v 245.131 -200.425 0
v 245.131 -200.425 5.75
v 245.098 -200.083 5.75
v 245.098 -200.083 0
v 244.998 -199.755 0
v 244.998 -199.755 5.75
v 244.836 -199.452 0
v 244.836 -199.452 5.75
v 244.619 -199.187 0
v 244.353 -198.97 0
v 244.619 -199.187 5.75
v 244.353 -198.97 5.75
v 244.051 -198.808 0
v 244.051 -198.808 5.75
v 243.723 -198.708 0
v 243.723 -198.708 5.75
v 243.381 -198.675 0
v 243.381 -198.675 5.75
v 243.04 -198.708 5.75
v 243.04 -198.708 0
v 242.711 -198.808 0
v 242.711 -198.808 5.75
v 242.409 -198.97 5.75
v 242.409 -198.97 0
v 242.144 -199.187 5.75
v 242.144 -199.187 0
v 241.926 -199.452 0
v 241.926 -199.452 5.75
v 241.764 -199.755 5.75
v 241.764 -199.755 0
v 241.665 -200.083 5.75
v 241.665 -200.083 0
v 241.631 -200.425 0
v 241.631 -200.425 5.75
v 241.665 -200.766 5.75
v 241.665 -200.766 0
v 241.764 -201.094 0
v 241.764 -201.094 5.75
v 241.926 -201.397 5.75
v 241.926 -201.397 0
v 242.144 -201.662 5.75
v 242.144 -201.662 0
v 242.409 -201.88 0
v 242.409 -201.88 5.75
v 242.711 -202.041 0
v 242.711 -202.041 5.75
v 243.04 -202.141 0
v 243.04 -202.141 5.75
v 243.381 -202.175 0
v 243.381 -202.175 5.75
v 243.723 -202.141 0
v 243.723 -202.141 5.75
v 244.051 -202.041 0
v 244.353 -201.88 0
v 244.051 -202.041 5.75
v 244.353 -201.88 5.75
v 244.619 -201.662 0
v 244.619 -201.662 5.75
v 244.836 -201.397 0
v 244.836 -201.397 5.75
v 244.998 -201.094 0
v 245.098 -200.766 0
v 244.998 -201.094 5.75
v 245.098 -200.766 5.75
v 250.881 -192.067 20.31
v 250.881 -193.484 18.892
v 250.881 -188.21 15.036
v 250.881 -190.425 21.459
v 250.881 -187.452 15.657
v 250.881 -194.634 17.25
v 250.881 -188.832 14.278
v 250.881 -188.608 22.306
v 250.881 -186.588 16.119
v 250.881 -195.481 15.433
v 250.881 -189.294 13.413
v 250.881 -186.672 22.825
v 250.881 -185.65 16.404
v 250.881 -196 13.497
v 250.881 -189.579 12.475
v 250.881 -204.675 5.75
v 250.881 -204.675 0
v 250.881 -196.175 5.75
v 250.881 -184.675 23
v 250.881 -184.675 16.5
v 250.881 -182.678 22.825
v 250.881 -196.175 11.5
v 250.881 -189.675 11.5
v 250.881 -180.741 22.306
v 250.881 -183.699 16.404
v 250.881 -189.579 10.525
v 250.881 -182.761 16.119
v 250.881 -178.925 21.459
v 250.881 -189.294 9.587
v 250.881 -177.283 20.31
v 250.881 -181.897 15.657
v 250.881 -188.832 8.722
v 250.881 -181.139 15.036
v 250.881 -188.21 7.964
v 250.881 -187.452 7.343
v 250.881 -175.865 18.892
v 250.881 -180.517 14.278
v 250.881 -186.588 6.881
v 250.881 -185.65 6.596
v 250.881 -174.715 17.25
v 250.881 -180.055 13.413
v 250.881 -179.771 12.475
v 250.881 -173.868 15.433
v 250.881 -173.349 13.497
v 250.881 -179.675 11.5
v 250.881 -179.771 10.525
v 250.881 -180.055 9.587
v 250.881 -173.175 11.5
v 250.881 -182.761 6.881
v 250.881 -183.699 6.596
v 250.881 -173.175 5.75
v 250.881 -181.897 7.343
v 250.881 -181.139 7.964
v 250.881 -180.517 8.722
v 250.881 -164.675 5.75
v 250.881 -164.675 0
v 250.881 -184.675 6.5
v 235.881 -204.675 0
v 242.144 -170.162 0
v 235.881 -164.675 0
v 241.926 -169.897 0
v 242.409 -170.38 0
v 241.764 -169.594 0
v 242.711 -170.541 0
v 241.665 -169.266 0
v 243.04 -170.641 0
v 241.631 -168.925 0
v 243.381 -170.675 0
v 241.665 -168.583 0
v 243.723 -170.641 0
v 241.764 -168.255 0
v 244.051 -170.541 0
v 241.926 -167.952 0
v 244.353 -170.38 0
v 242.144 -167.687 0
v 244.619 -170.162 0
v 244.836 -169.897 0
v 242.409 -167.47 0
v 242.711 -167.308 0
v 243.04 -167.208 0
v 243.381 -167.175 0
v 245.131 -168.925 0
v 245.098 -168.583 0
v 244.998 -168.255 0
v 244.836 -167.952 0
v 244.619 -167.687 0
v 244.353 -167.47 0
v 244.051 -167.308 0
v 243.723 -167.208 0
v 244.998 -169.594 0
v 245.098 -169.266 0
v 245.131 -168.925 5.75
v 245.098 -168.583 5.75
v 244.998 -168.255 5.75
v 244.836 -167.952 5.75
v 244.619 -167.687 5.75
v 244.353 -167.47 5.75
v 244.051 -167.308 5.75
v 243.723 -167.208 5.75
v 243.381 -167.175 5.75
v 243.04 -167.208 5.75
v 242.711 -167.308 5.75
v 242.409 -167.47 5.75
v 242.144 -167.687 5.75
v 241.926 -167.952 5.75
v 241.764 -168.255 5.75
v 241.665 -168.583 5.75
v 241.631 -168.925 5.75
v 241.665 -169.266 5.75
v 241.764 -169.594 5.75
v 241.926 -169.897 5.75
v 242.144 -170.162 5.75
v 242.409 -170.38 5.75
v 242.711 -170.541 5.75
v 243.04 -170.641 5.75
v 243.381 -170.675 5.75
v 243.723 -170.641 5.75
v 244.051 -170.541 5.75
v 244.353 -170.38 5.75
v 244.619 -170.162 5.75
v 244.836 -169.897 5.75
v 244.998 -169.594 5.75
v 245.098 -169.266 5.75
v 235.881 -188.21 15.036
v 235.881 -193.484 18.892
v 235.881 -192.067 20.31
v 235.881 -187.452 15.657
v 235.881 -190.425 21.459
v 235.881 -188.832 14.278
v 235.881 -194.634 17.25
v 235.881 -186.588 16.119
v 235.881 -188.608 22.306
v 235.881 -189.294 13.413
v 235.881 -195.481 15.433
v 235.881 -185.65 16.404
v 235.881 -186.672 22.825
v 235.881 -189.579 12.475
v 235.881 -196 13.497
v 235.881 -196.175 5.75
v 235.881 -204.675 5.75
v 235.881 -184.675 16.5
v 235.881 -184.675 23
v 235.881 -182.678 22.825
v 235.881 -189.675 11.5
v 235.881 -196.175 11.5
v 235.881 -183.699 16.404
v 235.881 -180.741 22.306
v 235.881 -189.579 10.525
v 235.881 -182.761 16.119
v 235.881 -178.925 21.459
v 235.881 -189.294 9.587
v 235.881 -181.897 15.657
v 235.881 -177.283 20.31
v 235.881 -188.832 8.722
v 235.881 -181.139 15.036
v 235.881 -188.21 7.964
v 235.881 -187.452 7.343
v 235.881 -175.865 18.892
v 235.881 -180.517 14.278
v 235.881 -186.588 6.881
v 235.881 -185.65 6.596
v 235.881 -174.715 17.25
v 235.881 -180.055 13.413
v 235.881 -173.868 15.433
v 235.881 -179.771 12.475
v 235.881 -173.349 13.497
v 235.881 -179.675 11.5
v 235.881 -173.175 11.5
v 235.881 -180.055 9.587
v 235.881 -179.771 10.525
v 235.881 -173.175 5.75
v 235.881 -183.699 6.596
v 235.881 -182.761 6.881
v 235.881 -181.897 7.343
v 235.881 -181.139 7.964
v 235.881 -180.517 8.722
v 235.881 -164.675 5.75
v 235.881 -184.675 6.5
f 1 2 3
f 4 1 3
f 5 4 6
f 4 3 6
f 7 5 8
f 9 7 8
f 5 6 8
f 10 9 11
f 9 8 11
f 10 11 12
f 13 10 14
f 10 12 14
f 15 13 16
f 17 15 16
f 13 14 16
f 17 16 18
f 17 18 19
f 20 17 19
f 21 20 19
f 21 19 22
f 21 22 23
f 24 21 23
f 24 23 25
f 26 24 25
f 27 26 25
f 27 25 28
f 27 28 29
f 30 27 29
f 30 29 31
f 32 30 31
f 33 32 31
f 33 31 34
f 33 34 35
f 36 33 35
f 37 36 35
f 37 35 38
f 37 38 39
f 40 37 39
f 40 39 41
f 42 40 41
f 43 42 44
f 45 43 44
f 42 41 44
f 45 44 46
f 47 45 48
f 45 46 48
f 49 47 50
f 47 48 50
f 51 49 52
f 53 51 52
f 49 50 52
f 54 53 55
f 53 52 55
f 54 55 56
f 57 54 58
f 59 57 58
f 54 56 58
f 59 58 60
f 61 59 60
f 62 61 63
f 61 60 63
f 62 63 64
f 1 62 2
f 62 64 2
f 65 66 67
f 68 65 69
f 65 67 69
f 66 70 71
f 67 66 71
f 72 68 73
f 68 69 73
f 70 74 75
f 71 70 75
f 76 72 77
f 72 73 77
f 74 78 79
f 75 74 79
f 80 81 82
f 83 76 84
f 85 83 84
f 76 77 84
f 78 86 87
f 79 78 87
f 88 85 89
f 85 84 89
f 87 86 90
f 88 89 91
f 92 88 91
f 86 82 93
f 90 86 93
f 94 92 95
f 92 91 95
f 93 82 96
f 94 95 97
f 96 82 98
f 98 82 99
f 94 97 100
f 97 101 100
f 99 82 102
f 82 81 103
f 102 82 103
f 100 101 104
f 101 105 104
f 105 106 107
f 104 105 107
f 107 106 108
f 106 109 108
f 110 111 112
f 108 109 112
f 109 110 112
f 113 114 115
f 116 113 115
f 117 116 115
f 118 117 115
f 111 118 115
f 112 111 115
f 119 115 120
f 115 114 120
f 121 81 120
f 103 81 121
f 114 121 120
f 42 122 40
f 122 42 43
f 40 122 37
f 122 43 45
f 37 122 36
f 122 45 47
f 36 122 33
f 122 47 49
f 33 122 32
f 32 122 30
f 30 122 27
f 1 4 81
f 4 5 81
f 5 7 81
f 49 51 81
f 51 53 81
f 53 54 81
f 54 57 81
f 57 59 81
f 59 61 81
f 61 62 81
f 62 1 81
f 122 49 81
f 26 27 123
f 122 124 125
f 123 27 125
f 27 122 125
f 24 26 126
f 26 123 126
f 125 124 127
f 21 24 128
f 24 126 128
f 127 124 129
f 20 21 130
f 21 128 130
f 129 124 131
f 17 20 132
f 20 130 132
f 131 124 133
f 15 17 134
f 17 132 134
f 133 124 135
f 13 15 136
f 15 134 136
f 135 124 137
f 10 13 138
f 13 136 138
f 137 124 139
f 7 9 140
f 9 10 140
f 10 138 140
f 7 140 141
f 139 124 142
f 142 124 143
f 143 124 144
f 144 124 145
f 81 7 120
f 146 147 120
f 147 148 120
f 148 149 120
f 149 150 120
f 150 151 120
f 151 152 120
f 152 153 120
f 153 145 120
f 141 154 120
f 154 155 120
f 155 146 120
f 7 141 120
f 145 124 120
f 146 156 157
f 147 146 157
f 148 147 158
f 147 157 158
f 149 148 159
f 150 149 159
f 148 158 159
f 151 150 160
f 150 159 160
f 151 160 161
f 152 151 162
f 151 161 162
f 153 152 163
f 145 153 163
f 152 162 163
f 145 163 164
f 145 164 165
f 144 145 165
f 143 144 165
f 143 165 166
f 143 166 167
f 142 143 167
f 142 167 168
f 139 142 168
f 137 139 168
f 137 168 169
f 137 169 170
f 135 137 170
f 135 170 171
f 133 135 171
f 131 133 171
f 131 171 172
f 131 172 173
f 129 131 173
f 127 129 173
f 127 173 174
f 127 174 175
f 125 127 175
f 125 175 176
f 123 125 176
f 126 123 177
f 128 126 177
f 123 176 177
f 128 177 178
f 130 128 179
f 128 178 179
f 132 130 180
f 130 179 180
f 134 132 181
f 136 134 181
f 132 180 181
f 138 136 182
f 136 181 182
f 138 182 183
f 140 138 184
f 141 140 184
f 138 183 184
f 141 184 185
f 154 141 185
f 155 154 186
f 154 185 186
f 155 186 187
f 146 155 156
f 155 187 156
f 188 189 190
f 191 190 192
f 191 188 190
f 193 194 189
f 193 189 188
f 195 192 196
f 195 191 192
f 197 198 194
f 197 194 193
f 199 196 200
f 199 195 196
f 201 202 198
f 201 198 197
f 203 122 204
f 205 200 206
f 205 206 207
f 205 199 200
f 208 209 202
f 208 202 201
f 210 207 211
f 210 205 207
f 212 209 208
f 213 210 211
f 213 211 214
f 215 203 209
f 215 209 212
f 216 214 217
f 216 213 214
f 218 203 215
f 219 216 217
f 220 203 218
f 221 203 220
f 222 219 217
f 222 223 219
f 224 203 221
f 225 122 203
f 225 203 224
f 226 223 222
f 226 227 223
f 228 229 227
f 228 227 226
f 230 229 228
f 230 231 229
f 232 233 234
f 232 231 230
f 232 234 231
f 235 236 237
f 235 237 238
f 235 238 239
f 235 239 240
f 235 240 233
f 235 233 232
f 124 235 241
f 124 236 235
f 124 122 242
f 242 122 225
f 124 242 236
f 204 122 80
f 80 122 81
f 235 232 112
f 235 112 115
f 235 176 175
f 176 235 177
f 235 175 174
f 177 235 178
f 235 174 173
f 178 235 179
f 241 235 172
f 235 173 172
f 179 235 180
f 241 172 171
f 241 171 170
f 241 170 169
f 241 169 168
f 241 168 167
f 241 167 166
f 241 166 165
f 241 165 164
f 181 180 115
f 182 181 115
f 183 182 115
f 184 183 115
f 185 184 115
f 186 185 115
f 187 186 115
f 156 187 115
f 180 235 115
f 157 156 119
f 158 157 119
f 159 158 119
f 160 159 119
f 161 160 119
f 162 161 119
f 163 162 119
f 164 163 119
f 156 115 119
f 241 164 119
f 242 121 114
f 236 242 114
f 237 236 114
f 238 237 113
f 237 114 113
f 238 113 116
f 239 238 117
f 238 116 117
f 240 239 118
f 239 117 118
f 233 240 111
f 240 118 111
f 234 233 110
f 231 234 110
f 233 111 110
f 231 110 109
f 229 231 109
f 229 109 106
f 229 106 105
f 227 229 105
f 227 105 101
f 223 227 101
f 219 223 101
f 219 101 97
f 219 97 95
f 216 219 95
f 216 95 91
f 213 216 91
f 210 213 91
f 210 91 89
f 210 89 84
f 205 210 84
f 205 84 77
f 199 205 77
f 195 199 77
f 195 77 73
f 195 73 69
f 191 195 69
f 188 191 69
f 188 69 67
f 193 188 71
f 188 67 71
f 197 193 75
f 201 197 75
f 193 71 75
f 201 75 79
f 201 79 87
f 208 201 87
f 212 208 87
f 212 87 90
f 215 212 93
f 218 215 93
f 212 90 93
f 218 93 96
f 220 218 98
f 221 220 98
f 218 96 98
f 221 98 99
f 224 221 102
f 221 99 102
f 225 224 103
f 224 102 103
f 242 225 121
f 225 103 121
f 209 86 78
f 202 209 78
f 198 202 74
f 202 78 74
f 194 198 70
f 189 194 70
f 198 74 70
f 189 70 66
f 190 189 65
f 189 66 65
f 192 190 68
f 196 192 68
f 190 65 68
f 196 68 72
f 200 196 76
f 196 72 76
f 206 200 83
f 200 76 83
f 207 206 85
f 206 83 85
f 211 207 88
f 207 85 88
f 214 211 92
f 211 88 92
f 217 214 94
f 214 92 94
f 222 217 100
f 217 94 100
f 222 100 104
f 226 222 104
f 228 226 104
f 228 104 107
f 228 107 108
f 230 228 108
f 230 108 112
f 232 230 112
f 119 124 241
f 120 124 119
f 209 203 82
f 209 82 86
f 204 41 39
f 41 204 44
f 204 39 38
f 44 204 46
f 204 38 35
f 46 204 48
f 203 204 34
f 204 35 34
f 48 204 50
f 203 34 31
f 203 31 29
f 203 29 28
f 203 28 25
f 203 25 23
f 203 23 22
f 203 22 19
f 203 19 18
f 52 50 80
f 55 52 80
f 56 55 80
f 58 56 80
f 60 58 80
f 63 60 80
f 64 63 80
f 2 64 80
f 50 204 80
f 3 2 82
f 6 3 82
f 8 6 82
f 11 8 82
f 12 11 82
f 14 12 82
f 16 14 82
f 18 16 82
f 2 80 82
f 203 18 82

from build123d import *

# Parameters (mm, degrees)
SKETCH1_W           = 15
SKETCH1_H           = 40
BOSS_EXTRUDE1_DEPTH = 23
SKETCH2_OUTSIDE_W   = 34.704
SKETCH2_OUTSIDE_H   = 51.704
CUT_EXTRUDE1_DEPTH  = 207.508357771
SKETCH3_R           = 5
CUT_EXTRUDE2_DEPTH  = 207.508357771
SKETCH4_R           = 1.75
CUT_EXTRUDE3_DEPTH  = 17


with BuildPart() as part:
    # Sketch1 → Boss-Extrude1 (new body)
    with BuildSketch(Plane.XY):
        with Locations((243.381155173, -184.674624292)):
            Rectangle(SKETCH1_W, SKETCH1_H)
    extrude(amount=BOSS_EXTRUDE1_DEPTH)

    # Sketch2 outside → Cut-Extrude1 (cut, through all)
    with BuildSketch(Plane(origin=(250.881155173, 0, 0), x_dir=(0, 0, -1), z_dir=(1, 0, 0))):
        with Locations((-11.5, -184.675)):
            Rectangle(SKETCH2_OUTSIDE_W, SKETCH2_OUTSIDE_H)
        with BuildLine():
            Line((-11.5, -173.174624292), (-5.75, -173.174624292))
            Line((-5.75, -173.174624292), (-5.75, -164.674624292))
            Line((-5.75, -164.674624292), (0, -164.674624292))
            Line((0, -164.674624292), (0, -204.674624292))
            Line((0, -204.674624292), (-5.75, -204.674624292))
            Line((-5.75, -204.674624292), (-5.75, -196.174624292))
            Line((-5.75, -196.174624292), (-11.5, -196.174624292))
            ThreePointArc((-11.5, -196.174624292), (-23, -184.674624292), (-11.5, -173.174624292))
        make_face(mode=Mode.SUBTRACT)
    extrude(amount=-CUT_EXTRUDE1_DEPTH, mode=Mode.SUBTRACT)

    # Sketch3 → Cut-Extrude2 (cut, through all)
    with BuildSketch(Plane(origin=(250.881155173, 0, 0), x_dir=(0, 0, -1), z_dir=(1, 0, 0))):
        with Locations((-11.5, -184.674624292)):
            Circle(SKETCH3_R)
    extrude(amount=-CUT_EXTRUDE2_DEPTH, mode=Mode.SUBTRACT)

    # Sketch4 → Cut-Extrude3 (cut)
    with BuildSketch(Plane.XY.offset(5.75)):
        with Locations((243.381155173, -200.424624292)):
            Circle(SKETCH4_R)
        with Locations((243.381155173, -168.924624292)):
            Circle(SKETCH4_R)
    extrude(amount=-CUT_EXTRUDE3_DEPTH, mode=Mode.SUBTRACT)


solid = part.part
